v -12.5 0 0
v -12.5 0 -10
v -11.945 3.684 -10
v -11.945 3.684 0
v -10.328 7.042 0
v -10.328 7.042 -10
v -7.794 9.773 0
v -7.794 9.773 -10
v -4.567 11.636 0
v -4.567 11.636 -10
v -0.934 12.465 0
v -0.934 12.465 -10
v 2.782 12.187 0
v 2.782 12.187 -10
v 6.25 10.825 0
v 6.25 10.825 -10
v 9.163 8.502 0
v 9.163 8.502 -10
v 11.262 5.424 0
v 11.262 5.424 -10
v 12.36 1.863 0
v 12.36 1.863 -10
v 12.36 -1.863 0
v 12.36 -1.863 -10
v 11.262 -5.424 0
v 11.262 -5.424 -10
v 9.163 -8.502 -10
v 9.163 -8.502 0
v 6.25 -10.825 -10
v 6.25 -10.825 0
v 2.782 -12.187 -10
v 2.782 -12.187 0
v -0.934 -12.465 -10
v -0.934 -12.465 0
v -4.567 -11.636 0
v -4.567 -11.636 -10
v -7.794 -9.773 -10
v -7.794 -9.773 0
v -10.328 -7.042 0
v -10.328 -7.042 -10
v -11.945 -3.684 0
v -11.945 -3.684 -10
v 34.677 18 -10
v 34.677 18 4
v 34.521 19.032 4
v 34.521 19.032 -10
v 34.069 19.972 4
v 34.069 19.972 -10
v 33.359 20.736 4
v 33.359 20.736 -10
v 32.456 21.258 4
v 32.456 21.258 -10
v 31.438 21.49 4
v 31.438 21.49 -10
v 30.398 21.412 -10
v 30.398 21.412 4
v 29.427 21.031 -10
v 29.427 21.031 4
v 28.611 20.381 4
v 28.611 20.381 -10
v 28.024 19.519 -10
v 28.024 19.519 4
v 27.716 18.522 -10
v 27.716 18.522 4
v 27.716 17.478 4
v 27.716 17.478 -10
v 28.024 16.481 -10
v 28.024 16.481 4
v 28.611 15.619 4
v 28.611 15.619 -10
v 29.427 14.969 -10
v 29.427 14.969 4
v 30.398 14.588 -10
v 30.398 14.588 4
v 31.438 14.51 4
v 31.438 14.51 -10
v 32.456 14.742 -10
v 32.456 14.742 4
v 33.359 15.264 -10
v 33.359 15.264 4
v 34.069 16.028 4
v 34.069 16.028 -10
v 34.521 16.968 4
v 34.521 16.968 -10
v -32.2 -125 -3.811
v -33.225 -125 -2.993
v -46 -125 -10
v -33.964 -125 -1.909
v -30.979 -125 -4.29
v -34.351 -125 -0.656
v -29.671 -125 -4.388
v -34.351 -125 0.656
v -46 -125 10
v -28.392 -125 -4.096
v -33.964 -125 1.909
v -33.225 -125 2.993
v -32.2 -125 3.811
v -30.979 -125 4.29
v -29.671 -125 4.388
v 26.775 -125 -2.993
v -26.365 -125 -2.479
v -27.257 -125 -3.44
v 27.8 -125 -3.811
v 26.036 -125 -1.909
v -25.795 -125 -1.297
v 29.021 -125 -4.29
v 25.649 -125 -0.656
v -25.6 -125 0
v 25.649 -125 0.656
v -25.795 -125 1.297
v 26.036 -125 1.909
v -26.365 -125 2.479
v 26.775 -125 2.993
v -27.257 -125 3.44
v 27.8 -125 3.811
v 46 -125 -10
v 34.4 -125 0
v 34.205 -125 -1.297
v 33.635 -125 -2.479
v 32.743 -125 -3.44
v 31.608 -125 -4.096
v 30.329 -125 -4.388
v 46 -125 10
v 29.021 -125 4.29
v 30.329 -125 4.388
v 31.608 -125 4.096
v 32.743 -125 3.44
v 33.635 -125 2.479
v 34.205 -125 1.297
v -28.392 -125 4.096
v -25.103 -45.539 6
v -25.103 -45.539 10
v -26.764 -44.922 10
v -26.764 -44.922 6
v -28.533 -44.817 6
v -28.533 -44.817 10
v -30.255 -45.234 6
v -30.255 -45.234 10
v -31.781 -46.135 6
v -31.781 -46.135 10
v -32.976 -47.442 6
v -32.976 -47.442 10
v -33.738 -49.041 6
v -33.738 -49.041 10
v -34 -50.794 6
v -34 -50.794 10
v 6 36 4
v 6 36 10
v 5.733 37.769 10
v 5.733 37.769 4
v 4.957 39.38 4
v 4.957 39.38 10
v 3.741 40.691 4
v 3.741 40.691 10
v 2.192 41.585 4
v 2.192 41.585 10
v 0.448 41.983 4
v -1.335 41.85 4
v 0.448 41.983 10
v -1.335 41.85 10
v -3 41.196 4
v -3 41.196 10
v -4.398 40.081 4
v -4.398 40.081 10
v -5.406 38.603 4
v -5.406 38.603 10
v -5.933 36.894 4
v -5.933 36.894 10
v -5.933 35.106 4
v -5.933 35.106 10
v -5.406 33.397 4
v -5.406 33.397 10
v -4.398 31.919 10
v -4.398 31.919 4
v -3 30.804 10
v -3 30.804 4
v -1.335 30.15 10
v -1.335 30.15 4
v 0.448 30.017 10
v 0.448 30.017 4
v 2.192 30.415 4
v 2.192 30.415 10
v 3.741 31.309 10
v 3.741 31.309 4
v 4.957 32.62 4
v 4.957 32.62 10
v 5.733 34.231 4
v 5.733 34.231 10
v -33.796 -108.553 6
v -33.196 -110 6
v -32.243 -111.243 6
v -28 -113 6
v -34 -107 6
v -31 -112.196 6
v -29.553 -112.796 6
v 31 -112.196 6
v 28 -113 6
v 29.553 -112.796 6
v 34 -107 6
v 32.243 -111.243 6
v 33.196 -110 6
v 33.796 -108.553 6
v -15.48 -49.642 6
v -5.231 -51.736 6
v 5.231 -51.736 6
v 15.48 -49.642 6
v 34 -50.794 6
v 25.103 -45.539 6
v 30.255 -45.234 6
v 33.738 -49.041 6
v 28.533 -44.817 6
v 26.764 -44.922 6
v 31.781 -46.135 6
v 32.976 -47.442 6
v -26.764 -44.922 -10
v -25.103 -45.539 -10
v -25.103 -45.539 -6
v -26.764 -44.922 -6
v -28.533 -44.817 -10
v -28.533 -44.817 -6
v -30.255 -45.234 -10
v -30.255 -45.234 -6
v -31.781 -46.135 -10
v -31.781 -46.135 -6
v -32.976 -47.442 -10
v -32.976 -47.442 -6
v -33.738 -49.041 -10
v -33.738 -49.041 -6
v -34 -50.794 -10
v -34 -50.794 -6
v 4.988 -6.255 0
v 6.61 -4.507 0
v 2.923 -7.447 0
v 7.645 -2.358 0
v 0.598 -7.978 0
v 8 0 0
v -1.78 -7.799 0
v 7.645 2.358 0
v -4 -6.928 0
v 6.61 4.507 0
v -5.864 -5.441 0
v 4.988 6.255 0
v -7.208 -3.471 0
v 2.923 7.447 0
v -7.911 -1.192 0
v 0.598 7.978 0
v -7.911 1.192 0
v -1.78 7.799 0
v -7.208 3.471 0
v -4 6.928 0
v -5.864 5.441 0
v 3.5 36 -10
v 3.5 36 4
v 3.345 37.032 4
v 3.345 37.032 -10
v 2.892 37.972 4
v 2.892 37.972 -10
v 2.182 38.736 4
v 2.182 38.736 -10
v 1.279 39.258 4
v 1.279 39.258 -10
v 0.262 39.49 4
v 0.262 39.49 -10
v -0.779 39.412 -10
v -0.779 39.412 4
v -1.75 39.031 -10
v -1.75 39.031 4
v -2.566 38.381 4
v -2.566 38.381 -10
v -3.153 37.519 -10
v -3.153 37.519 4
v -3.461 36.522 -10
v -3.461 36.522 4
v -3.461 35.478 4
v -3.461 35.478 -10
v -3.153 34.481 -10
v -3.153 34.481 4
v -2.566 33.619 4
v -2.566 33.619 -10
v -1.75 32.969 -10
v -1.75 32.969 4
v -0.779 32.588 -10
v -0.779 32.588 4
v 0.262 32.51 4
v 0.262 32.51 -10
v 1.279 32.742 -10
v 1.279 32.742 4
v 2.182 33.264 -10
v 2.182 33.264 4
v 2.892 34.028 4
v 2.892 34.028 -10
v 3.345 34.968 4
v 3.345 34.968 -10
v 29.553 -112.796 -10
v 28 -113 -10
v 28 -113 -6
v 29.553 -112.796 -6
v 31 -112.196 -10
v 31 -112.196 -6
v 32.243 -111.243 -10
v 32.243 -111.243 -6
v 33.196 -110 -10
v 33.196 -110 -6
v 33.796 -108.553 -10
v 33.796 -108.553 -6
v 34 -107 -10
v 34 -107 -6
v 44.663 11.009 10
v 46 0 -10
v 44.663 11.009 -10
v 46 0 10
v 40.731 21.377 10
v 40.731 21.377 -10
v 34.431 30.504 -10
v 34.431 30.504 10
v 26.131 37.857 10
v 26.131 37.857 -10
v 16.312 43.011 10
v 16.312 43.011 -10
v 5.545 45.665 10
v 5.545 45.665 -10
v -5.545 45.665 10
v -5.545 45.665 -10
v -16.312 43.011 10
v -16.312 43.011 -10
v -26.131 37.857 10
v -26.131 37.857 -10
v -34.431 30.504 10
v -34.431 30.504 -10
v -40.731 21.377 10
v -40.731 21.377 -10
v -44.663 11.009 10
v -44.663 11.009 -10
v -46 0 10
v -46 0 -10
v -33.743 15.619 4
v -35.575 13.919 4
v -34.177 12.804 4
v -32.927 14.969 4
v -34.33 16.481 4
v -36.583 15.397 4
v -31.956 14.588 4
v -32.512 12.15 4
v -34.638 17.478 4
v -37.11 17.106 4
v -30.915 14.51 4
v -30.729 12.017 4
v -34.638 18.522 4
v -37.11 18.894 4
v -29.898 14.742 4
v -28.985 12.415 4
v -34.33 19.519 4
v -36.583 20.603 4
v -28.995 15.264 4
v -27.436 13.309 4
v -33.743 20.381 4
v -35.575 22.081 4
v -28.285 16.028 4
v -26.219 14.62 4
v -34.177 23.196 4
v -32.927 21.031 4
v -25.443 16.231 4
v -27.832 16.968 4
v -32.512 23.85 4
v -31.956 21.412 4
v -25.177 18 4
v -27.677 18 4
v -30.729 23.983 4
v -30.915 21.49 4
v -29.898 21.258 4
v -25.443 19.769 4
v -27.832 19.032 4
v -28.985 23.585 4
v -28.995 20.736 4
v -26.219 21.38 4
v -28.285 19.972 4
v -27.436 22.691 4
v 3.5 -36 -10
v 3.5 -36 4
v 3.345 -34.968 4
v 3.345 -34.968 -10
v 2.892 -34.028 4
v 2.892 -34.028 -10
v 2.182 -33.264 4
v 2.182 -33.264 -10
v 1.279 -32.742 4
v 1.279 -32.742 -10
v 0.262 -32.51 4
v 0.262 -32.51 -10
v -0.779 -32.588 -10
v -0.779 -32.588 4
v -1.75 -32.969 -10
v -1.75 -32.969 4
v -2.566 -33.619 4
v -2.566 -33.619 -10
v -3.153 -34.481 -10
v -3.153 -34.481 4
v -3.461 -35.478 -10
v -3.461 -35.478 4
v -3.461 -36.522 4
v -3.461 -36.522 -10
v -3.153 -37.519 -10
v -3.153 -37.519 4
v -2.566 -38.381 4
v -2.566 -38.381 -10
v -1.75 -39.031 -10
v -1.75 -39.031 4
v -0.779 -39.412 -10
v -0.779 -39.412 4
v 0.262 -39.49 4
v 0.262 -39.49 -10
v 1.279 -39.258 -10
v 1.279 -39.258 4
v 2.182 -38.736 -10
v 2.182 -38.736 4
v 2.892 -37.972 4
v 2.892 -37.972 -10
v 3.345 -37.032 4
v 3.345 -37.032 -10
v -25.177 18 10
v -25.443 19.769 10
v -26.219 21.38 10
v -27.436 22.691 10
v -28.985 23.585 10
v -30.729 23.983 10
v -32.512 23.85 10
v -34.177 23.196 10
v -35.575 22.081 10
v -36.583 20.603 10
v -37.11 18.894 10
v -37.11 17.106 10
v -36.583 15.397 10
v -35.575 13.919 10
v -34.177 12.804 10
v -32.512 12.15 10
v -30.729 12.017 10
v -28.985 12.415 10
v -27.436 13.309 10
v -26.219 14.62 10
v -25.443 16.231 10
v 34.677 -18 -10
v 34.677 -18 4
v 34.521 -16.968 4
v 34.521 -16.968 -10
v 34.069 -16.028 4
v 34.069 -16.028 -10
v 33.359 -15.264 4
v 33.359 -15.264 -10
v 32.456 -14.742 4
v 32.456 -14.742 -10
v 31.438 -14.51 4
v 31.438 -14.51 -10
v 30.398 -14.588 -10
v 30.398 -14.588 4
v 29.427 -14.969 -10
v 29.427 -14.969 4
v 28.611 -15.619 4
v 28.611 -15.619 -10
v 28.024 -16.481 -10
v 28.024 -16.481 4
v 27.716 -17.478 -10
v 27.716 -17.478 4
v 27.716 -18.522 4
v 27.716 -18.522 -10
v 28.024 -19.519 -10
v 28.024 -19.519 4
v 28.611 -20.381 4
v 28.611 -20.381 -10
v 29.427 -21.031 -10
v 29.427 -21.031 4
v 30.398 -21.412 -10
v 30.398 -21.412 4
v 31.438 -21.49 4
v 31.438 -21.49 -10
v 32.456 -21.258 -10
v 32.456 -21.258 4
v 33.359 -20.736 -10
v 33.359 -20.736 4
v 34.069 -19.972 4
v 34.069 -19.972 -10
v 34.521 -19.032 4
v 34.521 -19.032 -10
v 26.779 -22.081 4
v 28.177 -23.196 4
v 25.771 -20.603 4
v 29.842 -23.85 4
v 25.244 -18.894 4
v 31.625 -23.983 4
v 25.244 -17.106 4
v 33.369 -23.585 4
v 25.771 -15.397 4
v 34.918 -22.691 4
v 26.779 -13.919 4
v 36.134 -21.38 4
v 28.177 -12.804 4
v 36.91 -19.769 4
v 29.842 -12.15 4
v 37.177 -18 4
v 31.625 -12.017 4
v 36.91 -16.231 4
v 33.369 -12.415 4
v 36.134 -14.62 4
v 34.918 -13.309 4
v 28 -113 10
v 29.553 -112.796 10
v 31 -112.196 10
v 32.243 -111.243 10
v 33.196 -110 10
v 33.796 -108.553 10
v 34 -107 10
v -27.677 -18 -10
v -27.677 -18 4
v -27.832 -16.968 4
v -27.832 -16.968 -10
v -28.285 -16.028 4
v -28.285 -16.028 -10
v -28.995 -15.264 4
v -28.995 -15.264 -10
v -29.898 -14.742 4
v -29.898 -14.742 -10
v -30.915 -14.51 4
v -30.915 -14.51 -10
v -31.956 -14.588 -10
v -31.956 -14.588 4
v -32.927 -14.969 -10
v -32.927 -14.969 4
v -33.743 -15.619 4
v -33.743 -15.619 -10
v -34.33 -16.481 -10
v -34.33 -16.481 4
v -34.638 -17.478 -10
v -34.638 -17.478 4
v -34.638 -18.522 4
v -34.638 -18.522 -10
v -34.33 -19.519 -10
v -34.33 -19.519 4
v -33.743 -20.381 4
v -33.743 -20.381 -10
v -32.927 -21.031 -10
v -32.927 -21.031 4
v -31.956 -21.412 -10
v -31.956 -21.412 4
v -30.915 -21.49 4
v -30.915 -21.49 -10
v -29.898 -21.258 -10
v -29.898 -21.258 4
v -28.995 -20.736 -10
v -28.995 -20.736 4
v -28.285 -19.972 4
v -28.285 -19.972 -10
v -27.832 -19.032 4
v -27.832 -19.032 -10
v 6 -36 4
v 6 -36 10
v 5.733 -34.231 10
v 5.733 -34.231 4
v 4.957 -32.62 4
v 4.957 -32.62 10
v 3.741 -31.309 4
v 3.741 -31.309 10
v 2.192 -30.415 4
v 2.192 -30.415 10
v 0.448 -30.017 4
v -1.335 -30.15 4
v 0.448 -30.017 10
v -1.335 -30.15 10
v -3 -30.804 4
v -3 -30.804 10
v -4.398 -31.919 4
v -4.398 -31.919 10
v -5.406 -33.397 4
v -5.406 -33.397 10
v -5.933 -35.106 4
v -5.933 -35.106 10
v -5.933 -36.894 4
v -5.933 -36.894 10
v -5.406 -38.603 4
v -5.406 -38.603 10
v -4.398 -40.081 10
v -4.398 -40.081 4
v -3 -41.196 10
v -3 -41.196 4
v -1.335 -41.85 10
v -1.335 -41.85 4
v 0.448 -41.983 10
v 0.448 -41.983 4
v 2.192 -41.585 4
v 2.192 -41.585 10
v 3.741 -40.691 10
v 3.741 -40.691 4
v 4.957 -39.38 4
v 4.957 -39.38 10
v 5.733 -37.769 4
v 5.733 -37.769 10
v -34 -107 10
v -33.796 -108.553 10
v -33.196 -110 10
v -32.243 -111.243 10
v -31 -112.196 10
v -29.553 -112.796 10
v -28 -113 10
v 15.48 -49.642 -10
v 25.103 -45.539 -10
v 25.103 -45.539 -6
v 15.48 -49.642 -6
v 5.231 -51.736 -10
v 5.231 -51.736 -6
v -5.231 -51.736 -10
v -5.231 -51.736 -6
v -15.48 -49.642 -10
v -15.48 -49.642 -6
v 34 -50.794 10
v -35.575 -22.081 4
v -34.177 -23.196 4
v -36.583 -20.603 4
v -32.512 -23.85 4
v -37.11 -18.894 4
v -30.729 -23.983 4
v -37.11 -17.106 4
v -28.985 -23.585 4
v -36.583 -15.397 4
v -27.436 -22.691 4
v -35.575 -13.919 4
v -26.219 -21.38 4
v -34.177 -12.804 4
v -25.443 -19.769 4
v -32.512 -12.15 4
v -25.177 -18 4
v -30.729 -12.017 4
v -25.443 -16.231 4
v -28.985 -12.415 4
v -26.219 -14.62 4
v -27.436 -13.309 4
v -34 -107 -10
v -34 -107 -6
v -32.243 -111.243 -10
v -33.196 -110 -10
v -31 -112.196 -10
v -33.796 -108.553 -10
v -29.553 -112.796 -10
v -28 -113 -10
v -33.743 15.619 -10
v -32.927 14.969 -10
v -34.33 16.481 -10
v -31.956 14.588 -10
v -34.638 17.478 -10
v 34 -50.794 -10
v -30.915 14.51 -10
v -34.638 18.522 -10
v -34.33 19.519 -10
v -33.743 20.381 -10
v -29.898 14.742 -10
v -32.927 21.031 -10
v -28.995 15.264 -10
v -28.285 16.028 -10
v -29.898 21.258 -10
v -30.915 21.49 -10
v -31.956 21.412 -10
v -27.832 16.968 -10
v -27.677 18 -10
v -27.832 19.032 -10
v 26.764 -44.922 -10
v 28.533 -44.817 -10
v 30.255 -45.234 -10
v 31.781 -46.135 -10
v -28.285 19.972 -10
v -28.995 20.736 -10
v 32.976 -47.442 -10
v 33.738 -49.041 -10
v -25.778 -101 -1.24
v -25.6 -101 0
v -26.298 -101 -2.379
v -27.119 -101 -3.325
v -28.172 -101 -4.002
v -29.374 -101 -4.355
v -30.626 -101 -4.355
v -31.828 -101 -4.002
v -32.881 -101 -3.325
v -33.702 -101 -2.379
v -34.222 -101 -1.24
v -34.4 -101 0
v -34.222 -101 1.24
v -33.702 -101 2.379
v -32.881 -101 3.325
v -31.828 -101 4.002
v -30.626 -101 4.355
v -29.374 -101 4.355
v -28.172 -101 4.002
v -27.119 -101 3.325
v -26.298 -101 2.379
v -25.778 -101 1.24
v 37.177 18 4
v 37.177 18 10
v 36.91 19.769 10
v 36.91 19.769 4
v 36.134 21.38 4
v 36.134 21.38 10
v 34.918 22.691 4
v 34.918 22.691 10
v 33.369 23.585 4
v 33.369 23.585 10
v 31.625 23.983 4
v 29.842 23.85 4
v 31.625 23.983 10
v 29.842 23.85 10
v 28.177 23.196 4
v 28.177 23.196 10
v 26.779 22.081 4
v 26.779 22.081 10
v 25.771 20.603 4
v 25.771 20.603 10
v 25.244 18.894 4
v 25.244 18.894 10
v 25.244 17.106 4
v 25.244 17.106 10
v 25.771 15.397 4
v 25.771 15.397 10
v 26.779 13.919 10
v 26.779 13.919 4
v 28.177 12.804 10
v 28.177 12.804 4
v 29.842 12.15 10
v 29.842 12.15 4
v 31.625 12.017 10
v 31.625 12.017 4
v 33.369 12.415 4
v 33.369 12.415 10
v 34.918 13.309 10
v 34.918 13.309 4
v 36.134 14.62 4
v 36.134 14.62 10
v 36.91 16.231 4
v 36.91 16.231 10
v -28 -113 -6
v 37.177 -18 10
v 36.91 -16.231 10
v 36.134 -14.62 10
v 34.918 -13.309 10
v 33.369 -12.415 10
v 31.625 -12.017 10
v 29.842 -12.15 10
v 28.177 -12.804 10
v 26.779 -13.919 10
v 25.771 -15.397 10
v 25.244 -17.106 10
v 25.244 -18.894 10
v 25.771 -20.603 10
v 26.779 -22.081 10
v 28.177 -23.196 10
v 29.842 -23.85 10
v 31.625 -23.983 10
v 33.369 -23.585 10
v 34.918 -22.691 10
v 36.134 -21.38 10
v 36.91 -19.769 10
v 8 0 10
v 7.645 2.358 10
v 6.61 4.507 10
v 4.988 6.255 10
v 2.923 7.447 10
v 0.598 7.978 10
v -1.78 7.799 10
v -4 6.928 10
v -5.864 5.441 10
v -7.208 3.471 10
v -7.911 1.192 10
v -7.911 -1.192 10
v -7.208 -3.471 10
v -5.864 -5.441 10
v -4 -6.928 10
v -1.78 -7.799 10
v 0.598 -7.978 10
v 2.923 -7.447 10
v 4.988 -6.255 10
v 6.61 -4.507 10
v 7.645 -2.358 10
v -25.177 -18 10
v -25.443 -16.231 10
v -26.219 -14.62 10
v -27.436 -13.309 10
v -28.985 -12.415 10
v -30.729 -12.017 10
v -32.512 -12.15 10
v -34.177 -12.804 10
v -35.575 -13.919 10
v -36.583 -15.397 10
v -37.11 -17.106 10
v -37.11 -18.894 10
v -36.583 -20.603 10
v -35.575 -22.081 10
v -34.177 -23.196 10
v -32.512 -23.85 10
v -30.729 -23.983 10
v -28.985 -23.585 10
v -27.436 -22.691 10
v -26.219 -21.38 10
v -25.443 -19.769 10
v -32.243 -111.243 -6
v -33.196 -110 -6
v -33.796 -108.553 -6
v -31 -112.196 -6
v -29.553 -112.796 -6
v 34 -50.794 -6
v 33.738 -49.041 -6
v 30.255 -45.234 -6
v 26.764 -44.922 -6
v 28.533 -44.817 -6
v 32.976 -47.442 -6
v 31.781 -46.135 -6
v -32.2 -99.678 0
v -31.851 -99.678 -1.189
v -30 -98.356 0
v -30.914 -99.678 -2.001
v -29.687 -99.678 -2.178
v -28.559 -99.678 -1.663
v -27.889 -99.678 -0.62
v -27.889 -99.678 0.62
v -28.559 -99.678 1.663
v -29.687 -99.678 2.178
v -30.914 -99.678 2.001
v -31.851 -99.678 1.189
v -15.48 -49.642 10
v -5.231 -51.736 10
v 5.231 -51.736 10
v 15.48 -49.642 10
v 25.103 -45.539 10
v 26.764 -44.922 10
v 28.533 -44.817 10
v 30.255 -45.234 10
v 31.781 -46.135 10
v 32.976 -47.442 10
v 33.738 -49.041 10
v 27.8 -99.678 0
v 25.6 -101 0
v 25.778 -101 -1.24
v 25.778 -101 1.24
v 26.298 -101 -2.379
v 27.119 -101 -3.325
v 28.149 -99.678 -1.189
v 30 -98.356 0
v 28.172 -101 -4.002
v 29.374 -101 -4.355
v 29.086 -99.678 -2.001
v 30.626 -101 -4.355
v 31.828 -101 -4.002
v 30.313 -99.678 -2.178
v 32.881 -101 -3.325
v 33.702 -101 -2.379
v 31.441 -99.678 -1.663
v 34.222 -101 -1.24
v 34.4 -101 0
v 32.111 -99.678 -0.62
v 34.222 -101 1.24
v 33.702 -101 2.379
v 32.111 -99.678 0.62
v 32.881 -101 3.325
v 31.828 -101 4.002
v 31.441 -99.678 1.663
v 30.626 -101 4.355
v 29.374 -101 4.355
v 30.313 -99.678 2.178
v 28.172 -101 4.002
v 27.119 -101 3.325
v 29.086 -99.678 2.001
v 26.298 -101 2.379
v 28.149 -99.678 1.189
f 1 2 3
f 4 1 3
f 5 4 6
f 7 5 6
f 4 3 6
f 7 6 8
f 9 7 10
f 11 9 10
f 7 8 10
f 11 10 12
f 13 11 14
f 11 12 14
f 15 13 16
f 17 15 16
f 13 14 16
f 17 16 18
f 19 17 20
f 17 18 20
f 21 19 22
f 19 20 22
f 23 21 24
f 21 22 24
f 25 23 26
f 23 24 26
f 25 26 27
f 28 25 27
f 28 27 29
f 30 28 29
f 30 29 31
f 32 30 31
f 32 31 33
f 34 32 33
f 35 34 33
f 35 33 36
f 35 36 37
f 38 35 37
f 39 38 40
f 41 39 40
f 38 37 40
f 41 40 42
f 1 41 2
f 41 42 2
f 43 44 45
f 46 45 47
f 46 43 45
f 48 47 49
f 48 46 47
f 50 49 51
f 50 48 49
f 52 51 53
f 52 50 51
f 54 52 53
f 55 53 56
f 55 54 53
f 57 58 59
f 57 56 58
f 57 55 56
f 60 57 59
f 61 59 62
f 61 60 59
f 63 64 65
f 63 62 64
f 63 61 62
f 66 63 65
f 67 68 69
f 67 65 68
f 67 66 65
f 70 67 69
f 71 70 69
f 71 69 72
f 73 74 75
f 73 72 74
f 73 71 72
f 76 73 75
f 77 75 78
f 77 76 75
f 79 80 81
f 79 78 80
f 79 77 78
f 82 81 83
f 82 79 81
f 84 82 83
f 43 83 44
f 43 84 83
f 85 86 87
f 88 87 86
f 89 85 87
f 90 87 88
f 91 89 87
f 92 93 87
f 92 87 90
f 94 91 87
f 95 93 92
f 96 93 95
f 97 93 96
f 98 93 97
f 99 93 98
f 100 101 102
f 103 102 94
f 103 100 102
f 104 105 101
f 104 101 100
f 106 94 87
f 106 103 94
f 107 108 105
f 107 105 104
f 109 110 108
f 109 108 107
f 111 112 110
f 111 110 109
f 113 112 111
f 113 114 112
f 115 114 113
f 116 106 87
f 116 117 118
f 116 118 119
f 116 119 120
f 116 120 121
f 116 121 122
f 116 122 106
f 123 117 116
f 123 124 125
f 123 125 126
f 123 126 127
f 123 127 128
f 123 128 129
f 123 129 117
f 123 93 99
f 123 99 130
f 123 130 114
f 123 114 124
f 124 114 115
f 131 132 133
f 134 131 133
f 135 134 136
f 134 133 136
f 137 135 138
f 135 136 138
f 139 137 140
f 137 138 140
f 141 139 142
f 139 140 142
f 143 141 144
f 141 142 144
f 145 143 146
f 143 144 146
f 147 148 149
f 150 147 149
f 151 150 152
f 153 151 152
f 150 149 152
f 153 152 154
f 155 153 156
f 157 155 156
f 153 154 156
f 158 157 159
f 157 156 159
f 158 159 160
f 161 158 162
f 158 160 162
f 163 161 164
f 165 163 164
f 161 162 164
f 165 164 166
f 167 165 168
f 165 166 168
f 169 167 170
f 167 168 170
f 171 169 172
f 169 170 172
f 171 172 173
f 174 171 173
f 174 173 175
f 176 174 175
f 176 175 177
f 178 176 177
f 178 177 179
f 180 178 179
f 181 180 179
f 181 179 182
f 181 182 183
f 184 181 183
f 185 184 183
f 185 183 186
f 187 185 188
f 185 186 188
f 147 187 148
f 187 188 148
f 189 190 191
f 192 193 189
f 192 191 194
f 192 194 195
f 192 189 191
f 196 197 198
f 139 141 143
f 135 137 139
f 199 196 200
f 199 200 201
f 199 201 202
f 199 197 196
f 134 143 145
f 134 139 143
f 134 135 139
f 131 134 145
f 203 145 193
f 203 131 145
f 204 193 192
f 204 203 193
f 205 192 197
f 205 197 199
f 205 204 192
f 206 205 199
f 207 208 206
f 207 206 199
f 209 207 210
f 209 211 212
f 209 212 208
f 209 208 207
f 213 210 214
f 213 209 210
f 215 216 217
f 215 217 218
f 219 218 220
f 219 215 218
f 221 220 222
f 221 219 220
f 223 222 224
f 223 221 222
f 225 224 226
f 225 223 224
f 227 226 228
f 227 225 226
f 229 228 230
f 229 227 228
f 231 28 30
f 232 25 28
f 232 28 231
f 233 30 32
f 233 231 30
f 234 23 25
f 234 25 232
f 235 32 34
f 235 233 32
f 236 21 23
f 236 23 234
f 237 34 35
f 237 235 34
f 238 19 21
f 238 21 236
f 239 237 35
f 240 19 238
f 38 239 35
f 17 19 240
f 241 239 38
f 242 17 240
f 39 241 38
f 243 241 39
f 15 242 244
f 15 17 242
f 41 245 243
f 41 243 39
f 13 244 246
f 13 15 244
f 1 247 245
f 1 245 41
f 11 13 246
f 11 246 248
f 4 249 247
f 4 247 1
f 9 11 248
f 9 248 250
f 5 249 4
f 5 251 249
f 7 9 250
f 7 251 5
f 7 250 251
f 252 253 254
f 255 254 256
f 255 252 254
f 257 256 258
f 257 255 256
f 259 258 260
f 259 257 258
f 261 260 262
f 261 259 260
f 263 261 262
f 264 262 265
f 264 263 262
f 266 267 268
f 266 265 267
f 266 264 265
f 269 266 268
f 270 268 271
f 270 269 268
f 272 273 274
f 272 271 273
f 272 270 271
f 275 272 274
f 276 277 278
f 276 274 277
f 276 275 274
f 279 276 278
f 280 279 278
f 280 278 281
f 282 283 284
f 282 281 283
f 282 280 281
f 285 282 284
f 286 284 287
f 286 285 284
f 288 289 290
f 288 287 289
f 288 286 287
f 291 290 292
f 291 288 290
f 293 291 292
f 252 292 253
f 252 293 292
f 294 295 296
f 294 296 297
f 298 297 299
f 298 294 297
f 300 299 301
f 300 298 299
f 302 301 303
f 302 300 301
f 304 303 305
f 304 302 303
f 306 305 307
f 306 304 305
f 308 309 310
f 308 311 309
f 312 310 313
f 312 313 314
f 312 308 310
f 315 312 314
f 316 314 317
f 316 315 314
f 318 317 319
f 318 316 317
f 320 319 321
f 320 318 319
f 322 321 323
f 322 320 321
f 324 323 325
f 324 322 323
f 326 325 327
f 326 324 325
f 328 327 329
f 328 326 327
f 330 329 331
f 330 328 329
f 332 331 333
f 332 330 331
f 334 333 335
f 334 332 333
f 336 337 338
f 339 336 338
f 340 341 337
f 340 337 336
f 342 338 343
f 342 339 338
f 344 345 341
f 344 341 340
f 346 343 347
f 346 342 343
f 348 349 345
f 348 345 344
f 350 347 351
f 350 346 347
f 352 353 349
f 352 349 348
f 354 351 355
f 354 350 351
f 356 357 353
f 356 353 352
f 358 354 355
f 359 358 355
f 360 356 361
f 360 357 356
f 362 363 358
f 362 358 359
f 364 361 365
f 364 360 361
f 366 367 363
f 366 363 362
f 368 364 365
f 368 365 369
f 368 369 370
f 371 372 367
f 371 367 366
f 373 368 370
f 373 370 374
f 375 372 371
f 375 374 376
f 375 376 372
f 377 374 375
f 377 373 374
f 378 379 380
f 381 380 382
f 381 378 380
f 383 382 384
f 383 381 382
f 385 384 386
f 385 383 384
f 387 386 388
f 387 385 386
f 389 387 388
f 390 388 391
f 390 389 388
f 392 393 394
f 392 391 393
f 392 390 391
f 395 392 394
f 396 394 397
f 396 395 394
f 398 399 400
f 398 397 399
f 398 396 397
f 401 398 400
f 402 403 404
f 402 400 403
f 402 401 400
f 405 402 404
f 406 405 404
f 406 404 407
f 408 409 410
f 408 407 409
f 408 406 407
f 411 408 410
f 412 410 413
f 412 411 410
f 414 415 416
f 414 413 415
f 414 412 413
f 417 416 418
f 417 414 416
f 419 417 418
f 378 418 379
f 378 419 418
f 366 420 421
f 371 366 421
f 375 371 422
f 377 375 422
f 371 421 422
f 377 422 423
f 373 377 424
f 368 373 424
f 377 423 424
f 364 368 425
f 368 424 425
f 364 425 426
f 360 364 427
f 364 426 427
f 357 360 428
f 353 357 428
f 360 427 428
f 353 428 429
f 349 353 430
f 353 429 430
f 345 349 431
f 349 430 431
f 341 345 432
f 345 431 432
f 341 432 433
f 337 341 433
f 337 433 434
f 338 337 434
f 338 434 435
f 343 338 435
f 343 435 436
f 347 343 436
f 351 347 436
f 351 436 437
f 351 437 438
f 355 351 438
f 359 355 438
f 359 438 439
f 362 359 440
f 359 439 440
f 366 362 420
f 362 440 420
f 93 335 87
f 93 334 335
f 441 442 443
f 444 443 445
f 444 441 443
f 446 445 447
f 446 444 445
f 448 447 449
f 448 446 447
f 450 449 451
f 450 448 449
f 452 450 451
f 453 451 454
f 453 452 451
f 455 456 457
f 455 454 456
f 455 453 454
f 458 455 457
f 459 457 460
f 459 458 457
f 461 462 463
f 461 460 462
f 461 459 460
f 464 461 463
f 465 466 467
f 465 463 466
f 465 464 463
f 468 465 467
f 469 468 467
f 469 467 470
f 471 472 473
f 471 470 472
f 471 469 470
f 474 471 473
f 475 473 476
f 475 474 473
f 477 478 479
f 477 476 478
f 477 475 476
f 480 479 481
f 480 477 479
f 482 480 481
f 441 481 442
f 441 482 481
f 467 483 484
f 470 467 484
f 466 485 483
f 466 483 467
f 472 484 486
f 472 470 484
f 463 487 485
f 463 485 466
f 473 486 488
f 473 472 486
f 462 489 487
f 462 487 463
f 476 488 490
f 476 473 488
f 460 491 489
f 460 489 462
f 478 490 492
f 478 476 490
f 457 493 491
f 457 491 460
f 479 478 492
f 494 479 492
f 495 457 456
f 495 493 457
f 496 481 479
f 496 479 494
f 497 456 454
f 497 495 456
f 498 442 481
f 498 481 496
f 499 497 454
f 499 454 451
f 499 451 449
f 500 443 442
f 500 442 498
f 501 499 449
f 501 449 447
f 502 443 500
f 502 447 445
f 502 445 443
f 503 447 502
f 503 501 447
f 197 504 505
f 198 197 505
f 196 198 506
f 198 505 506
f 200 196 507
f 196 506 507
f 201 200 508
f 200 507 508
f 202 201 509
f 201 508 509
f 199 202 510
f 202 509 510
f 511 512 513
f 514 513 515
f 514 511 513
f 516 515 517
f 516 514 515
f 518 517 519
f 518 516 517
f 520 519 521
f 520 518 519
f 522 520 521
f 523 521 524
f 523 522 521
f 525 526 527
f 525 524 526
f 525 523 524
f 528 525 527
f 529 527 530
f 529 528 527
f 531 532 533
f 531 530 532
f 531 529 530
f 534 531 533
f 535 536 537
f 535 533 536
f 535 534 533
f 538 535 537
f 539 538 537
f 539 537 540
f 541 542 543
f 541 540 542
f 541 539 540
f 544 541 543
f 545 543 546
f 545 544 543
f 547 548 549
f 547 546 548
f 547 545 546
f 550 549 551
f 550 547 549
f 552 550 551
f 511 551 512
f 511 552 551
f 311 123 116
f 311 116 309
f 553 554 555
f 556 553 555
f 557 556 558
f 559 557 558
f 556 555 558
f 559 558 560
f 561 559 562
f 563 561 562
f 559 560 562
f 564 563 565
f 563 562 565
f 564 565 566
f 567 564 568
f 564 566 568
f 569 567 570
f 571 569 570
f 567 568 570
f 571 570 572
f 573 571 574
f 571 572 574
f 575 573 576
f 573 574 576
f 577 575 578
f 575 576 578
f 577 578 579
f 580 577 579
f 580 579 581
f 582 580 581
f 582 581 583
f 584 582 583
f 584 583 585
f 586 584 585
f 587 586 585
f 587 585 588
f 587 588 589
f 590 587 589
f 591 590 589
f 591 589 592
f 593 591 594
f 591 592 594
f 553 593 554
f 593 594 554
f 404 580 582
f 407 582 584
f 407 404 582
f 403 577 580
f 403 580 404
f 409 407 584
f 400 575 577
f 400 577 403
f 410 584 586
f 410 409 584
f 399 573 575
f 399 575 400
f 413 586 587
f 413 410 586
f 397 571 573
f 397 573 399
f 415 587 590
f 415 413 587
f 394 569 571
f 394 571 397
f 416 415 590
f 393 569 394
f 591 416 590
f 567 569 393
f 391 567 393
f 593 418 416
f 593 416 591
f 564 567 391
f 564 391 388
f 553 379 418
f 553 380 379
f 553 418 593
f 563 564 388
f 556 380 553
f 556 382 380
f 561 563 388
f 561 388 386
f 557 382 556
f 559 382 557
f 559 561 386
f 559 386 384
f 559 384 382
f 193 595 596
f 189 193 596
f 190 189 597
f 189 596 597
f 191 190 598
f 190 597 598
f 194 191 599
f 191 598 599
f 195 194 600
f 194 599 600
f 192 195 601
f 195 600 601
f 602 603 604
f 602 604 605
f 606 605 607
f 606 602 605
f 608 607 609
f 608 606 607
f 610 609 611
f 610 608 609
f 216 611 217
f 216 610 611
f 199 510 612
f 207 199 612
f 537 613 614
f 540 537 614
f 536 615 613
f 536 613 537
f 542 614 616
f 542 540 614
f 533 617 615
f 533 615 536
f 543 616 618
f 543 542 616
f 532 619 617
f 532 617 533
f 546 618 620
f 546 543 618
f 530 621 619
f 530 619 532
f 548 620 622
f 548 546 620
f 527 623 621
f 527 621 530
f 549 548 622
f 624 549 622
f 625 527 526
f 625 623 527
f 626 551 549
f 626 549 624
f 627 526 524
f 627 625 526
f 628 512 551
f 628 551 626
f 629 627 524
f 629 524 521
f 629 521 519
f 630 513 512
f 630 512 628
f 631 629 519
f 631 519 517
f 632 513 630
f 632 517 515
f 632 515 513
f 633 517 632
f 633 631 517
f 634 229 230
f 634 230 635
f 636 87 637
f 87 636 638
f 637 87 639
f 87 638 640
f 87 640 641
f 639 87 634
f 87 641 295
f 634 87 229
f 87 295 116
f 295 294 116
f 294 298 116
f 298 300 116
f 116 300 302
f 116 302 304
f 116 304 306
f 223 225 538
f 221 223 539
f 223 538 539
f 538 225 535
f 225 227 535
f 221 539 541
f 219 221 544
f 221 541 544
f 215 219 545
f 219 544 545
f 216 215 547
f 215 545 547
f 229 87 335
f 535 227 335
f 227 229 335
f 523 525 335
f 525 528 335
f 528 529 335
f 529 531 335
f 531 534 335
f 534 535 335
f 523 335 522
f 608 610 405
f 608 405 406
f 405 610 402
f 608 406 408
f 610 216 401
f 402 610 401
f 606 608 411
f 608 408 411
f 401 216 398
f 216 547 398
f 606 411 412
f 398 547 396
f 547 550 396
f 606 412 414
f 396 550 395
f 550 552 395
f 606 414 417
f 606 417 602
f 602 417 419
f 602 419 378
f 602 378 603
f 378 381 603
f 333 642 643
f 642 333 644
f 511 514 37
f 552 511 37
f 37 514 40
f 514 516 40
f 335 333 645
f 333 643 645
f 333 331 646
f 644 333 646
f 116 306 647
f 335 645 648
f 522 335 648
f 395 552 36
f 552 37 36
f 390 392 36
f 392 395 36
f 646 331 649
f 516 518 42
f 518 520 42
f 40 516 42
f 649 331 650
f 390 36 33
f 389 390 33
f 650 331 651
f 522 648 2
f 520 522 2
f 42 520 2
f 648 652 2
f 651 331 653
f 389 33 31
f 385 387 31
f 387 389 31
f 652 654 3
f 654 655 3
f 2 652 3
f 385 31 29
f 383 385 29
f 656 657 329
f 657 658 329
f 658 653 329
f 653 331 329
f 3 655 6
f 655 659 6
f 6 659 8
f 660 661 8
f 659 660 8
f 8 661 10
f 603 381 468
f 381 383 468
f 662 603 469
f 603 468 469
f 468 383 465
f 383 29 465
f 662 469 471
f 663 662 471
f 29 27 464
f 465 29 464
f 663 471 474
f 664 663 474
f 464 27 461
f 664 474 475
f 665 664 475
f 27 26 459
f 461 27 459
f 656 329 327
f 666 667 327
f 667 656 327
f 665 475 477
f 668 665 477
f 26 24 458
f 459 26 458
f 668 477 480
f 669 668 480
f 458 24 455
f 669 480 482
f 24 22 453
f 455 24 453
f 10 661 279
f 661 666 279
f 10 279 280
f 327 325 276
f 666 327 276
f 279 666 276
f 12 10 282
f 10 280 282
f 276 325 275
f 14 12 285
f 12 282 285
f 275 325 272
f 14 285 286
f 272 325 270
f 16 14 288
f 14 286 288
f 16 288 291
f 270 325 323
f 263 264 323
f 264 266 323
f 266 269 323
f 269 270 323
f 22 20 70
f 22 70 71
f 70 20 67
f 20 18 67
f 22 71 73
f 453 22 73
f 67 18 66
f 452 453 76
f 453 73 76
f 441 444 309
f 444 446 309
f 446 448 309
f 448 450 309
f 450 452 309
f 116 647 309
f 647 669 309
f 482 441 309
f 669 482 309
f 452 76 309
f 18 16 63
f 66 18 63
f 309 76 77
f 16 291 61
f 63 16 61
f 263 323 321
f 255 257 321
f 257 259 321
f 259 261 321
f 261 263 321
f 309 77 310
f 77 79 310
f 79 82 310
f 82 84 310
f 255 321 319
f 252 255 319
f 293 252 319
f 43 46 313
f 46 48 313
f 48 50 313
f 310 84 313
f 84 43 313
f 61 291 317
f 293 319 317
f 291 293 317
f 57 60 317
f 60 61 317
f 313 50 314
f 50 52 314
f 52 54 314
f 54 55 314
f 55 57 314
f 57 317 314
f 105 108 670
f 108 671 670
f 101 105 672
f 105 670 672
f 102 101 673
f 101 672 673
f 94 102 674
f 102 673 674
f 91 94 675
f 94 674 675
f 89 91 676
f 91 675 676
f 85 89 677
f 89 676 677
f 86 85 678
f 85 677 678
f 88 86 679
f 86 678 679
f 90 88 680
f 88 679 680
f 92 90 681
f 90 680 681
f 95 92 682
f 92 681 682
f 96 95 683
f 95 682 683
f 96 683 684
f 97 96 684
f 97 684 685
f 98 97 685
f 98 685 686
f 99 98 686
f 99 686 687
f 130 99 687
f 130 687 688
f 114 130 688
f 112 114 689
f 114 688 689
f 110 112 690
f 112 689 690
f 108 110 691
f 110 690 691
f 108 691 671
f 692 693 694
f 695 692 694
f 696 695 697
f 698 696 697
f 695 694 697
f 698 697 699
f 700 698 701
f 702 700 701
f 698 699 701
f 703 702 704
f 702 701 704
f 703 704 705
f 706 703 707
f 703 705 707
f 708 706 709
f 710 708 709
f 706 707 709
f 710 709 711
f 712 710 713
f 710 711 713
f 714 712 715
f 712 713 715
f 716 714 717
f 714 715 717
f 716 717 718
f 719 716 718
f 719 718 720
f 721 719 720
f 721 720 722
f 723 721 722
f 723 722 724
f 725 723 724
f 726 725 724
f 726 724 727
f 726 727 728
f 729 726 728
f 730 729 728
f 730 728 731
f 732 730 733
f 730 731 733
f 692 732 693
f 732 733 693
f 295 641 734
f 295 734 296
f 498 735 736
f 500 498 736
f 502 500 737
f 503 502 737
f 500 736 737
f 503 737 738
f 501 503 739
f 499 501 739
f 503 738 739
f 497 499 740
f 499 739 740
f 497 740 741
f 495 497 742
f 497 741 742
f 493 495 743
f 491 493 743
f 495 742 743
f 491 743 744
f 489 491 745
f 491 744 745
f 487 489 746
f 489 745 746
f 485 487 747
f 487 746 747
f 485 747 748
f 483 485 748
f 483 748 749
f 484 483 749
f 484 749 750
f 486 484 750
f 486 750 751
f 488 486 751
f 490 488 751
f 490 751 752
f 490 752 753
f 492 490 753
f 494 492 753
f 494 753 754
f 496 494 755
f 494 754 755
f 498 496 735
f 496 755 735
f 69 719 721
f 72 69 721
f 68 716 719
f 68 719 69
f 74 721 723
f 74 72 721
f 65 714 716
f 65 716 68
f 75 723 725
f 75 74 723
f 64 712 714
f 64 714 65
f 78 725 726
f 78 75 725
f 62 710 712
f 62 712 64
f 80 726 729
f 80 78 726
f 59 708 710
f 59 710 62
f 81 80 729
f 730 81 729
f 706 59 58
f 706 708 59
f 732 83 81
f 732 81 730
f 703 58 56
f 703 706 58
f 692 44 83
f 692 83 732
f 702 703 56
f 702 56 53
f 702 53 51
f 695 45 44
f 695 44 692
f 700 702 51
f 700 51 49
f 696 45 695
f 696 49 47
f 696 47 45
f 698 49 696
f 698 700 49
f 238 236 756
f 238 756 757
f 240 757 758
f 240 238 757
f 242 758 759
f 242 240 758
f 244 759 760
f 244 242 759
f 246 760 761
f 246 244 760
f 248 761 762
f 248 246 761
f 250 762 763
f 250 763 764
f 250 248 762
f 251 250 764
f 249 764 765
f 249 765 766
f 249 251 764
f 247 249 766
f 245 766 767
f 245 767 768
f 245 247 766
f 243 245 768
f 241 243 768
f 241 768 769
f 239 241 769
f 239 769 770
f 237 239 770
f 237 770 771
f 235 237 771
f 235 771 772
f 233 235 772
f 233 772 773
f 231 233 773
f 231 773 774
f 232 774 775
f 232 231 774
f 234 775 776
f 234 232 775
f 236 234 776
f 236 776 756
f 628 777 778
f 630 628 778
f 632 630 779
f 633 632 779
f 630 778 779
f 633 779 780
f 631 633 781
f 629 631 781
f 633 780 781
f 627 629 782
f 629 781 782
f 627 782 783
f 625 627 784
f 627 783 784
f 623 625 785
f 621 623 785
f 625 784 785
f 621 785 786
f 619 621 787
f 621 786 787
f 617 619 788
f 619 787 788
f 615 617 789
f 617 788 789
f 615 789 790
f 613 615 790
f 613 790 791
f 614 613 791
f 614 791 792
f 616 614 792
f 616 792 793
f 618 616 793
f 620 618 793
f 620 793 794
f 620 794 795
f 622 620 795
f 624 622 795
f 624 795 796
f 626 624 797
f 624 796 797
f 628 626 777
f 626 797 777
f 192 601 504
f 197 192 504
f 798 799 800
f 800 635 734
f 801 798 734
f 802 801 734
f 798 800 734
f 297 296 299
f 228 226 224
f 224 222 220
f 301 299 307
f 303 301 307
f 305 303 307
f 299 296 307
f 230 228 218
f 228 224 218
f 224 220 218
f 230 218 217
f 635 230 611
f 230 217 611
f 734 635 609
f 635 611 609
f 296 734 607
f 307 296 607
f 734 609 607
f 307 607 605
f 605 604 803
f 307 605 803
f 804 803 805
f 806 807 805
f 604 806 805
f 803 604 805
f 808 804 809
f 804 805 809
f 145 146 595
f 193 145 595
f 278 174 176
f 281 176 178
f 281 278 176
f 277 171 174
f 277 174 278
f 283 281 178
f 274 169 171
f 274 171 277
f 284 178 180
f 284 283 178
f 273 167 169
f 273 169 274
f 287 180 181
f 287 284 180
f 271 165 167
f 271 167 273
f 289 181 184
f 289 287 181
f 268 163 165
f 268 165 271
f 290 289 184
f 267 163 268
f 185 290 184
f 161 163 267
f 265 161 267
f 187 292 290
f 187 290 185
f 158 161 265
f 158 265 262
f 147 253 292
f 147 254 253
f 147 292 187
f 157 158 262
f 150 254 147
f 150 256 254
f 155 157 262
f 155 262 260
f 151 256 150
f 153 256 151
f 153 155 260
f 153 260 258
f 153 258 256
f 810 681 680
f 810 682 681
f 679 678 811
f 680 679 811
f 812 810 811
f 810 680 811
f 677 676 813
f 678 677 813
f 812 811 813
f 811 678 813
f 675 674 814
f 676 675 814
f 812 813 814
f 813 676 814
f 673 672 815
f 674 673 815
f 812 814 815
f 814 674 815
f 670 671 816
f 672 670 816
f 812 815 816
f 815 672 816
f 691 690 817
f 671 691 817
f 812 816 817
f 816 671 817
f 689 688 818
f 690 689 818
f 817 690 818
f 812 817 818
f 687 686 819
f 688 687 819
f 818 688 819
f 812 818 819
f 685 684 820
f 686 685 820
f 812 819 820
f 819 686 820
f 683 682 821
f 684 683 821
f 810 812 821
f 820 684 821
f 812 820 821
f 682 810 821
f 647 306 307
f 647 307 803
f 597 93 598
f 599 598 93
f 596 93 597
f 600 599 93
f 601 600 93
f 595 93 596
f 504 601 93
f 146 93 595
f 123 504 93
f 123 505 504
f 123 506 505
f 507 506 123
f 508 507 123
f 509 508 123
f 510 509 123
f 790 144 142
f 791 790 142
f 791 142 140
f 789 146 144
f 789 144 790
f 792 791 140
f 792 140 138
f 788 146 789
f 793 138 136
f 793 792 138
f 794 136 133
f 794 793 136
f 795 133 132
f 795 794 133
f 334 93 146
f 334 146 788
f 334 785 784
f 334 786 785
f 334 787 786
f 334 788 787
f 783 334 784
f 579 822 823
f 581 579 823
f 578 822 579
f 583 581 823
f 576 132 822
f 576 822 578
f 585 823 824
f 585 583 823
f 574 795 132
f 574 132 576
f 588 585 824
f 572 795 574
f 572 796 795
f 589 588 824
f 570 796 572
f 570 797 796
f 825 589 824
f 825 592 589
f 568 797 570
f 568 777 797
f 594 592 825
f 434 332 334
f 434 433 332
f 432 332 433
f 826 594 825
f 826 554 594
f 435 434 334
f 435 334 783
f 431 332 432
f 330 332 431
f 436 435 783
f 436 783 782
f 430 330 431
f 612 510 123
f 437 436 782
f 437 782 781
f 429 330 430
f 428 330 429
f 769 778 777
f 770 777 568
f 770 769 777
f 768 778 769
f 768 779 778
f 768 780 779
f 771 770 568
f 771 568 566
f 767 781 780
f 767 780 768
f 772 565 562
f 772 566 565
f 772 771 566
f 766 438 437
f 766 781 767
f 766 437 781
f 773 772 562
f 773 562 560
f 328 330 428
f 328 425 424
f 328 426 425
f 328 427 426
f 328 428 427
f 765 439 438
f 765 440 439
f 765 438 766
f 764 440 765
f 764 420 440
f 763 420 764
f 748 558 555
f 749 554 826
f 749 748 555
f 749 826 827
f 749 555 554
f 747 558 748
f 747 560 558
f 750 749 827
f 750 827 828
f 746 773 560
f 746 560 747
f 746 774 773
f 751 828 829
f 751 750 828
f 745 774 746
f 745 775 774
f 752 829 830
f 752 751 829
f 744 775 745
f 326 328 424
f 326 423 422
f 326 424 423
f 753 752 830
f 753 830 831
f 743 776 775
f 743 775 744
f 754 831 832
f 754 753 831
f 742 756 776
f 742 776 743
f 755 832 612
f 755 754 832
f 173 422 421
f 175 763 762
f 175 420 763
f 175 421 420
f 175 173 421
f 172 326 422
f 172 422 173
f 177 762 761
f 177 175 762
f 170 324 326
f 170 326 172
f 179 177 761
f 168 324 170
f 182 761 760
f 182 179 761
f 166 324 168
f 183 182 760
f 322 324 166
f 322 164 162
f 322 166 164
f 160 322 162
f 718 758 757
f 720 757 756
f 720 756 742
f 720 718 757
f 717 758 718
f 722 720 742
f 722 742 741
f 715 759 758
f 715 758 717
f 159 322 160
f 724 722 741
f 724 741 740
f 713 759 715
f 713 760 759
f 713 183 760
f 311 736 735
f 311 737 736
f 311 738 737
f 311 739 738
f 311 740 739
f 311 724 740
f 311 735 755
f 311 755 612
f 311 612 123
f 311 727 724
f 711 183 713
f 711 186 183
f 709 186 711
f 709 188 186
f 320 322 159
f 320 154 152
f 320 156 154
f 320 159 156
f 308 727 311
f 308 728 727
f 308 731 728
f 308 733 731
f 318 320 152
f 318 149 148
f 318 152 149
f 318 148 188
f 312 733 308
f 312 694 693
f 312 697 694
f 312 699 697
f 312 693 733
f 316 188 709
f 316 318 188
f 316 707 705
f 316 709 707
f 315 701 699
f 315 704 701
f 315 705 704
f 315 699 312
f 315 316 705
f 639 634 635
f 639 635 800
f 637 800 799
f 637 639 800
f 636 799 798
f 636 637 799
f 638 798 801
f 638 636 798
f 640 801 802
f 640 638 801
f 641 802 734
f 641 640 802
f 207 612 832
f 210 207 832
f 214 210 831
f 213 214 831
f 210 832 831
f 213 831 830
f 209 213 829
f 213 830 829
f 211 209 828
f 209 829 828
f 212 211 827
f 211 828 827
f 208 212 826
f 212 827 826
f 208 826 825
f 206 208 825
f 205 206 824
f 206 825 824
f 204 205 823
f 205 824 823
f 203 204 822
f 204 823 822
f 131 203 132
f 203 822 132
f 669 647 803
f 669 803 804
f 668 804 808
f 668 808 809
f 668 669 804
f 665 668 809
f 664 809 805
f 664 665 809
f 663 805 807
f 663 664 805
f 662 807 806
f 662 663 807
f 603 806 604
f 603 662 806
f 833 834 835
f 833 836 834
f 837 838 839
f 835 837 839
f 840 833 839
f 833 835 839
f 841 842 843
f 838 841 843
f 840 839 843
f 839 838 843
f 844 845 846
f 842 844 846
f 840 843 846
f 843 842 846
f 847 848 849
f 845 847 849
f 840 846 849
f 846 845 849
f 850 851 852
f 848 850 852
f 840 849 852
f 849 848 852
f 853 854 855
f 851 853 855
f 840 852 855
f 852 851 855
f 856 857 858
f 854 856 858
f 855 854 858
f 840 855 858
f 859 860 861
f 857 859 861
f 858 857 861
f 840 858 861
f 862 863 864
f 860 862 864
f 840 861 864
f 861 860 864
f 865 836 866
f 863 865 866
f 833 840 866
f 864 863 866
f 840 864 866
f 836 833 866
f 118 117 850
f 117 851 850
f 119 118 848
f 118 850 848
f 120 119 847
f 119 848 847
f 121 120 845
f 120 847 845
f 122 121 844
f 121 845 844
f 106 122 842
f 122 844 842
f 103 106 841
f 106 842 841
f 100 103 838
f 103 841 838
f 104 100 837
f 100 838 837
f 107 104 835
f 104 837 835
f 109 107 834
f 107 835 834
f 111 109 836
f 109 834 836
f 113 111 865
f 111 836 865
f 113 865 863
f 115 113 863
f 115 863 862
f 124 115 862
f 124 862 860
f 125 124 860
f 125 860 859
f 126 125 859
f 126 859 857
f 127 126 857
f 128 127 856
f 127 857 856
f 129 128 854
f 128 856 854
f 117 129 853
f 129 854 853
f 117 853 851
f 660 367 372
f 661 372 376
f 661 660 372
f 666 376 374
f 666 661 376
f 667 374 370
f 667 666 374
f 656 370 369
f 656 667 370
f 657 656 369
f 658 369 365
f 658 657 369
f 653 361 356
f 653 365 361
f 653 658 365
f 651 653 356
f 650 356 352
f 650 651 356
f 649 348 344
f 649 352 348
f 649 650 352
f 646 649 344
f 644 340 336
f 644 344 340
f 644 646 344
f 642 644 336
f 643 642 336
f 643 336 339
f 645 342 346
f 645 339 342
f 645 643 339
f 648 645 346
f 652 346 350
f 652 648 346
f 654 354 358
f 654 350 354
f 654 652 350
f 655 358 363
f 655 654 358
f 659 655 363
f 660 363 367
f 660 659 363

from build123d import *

# Parameters (mm, degrees)
SKETCH2_R                         = 3.5
SKETCH2_R_2                       = 8
BOSS_EXTRUDE1_DEPTH               = 10
SKETCH4_R                         = 6
CUT_EXTRUDE1_DEPTH                = 6
CUT_EXTRUDE2_DEPTH                = 4
SKETCH6_R                         = 12.5
CUT_EXTRUDE3_DEPTH                = 10
TAP_DRILL_FOR_M10X1_25_TAP1_D     = 8.8
TAP_DRILL_FOR_M10X1_25_TAP1_DEPTH = 24
TAP_DRILL_FOR_M10X1_25_TAP1_TIP   = 2.643786724


with BuildPart() as part:
    # Sketch2 → Boss-Extrude1 (new, symmetric)
    with BuildSketch(Plane.XY):
        with BuildLine():
            Line((-46, 0), (-46, -125))
            Line((-46, -125), (46, -125))
            Line((46, -125), (46, 0))
            ThreePointArc((46, 0), (0, 46), (-46, 0))
        make_face()
        with Locations((0, 36)):
            Circle(SKETCH2_R, mode=Mode.SUBTRACT)
        Circle(SKETCH2_R_2, mode=Mode.SUBTRACT)
        with Locations((31.176914536, 18)):
            Circle(SKETCH2_R, mode=Mode.SUBTRACT)
        with Locations((31.176914536, -18)):
            Circle(SKETCH2_R, mode=Mode.SUBTRACT)
        with Locations((0, -36)):
            Circle(SKETCH2_R, mode=Mode.SUBTRACT)
        with Locations((-31.176914536, -18)):
            Circle(SKETCH2_R, mode=Mode.SUBTRACT)
        with Locations((-31.176914536, 18)):
            Circle(SKETCH2_R, mode=Mode.SUBTRACT)
    extrude(amount=BOSS_EXTRUDE1_DEPTH, both=True)

    # Sketch4 → Cut-Extrude1 (cut)
    with BuildSketch(Plane.XY.offset(10)):
        with Locations((0, 36)):
            Circle(SKETCH4_R)
        with Locations((31.176914536, 18)):
            Circle(SKETCH4_R)
        with Locations((31.176914536, -18)):
            Circle(SKETCH4_R)
        with Locations((0, -36)):
            Circle(SKETCH4_R)
        with Locations((-31.176914536, -18)):
            Circle(SKETCH4_R)
        with Locations((-31.176914536, 18)):
            Circle(SKETCH4_R)
    extrude(amount=-CUT_EXTRUDE1_DEPTH, mode=Mode.SUBTRACT)

    # Sketch5 → Cut-Extrude2 (cut)
    with BuildSketch(Plane.XY.offset(10)):
        with BuildLine():
            Line((34, -107), (34, -50.793700397))
            ThreePointArc((34, -50.793700397), (31.051285766, -45.627497229), (25.103448276, -45.539179666))
            ThreePointArc((25.103448276, -45.539179666), (0, -52), (-25.103448276, -45.539179666))
            ThreePointArc((-25.103448276, -45.539179666), (-31.051285766, -45.627497229), (-34, -50.793700397))
            Line((-34, -50.793700397), (-34, -107))
            ThreePointArc((-34, -107), (-32.242640687, -111.242640687), (-28, -113))
            Line((-28, -113), (28, -113))
            ThreePointArc((28, -113), (32.242640687, -111.242640687), (34, -107))
        make_face()
    cut_extrude2 = extrude(amount=-CUT_EXTRUDE2_DEPTH, mode=Mode.SUBTRACT)

    # Mirror1: Cut-Extrude2 across plane
    add(cut_extrude2.mirror(Plane.XY), mode=Mode.SUBTRACT)

    # Sketch6 → Cut-Extrude3 (cut)
    with BuildSketch(Plane(origin=(0, 0, -10), x_dir=(-1, 0, 0), z_dir=(0, 0, -1))):
        Circle(SKETCH6_R)
    extrude(amount=-CUT_EXTRUDE3_DEPTH, mode=Mode.SUBTRACT)

    # Tap Drill for M10x1.25 Tap1
    with Locations(Plane(origin=(0, -125, 0), x_dir=(-1, 0, 0), z_dir=(0, -1, 0))):
        with Locations((-30, 0), (30, 0)):
            Hole(TAP_DRILL_FOR_M10X1_25_TAP1_D / 2, depth=TAP_DRILL_FOR_M10X1_25_TAP1_DEPTH)
            with Locations((0, 0, -(TAP_DRILL_FOR_M10X1_25_TAP1_DEPTH + TAP_DRILL_FOR_M10X1_25_TAP1_TIP / 2))):  # 118° drill point
                Cone(0, TAP_DRILL_FOR_M10X1_25_TAP1_D / 2, TAP_DRILL_FOR_M10X1_25_TAP1_TIP, mode=Mode.SUBTRACT)


solid = part.part
